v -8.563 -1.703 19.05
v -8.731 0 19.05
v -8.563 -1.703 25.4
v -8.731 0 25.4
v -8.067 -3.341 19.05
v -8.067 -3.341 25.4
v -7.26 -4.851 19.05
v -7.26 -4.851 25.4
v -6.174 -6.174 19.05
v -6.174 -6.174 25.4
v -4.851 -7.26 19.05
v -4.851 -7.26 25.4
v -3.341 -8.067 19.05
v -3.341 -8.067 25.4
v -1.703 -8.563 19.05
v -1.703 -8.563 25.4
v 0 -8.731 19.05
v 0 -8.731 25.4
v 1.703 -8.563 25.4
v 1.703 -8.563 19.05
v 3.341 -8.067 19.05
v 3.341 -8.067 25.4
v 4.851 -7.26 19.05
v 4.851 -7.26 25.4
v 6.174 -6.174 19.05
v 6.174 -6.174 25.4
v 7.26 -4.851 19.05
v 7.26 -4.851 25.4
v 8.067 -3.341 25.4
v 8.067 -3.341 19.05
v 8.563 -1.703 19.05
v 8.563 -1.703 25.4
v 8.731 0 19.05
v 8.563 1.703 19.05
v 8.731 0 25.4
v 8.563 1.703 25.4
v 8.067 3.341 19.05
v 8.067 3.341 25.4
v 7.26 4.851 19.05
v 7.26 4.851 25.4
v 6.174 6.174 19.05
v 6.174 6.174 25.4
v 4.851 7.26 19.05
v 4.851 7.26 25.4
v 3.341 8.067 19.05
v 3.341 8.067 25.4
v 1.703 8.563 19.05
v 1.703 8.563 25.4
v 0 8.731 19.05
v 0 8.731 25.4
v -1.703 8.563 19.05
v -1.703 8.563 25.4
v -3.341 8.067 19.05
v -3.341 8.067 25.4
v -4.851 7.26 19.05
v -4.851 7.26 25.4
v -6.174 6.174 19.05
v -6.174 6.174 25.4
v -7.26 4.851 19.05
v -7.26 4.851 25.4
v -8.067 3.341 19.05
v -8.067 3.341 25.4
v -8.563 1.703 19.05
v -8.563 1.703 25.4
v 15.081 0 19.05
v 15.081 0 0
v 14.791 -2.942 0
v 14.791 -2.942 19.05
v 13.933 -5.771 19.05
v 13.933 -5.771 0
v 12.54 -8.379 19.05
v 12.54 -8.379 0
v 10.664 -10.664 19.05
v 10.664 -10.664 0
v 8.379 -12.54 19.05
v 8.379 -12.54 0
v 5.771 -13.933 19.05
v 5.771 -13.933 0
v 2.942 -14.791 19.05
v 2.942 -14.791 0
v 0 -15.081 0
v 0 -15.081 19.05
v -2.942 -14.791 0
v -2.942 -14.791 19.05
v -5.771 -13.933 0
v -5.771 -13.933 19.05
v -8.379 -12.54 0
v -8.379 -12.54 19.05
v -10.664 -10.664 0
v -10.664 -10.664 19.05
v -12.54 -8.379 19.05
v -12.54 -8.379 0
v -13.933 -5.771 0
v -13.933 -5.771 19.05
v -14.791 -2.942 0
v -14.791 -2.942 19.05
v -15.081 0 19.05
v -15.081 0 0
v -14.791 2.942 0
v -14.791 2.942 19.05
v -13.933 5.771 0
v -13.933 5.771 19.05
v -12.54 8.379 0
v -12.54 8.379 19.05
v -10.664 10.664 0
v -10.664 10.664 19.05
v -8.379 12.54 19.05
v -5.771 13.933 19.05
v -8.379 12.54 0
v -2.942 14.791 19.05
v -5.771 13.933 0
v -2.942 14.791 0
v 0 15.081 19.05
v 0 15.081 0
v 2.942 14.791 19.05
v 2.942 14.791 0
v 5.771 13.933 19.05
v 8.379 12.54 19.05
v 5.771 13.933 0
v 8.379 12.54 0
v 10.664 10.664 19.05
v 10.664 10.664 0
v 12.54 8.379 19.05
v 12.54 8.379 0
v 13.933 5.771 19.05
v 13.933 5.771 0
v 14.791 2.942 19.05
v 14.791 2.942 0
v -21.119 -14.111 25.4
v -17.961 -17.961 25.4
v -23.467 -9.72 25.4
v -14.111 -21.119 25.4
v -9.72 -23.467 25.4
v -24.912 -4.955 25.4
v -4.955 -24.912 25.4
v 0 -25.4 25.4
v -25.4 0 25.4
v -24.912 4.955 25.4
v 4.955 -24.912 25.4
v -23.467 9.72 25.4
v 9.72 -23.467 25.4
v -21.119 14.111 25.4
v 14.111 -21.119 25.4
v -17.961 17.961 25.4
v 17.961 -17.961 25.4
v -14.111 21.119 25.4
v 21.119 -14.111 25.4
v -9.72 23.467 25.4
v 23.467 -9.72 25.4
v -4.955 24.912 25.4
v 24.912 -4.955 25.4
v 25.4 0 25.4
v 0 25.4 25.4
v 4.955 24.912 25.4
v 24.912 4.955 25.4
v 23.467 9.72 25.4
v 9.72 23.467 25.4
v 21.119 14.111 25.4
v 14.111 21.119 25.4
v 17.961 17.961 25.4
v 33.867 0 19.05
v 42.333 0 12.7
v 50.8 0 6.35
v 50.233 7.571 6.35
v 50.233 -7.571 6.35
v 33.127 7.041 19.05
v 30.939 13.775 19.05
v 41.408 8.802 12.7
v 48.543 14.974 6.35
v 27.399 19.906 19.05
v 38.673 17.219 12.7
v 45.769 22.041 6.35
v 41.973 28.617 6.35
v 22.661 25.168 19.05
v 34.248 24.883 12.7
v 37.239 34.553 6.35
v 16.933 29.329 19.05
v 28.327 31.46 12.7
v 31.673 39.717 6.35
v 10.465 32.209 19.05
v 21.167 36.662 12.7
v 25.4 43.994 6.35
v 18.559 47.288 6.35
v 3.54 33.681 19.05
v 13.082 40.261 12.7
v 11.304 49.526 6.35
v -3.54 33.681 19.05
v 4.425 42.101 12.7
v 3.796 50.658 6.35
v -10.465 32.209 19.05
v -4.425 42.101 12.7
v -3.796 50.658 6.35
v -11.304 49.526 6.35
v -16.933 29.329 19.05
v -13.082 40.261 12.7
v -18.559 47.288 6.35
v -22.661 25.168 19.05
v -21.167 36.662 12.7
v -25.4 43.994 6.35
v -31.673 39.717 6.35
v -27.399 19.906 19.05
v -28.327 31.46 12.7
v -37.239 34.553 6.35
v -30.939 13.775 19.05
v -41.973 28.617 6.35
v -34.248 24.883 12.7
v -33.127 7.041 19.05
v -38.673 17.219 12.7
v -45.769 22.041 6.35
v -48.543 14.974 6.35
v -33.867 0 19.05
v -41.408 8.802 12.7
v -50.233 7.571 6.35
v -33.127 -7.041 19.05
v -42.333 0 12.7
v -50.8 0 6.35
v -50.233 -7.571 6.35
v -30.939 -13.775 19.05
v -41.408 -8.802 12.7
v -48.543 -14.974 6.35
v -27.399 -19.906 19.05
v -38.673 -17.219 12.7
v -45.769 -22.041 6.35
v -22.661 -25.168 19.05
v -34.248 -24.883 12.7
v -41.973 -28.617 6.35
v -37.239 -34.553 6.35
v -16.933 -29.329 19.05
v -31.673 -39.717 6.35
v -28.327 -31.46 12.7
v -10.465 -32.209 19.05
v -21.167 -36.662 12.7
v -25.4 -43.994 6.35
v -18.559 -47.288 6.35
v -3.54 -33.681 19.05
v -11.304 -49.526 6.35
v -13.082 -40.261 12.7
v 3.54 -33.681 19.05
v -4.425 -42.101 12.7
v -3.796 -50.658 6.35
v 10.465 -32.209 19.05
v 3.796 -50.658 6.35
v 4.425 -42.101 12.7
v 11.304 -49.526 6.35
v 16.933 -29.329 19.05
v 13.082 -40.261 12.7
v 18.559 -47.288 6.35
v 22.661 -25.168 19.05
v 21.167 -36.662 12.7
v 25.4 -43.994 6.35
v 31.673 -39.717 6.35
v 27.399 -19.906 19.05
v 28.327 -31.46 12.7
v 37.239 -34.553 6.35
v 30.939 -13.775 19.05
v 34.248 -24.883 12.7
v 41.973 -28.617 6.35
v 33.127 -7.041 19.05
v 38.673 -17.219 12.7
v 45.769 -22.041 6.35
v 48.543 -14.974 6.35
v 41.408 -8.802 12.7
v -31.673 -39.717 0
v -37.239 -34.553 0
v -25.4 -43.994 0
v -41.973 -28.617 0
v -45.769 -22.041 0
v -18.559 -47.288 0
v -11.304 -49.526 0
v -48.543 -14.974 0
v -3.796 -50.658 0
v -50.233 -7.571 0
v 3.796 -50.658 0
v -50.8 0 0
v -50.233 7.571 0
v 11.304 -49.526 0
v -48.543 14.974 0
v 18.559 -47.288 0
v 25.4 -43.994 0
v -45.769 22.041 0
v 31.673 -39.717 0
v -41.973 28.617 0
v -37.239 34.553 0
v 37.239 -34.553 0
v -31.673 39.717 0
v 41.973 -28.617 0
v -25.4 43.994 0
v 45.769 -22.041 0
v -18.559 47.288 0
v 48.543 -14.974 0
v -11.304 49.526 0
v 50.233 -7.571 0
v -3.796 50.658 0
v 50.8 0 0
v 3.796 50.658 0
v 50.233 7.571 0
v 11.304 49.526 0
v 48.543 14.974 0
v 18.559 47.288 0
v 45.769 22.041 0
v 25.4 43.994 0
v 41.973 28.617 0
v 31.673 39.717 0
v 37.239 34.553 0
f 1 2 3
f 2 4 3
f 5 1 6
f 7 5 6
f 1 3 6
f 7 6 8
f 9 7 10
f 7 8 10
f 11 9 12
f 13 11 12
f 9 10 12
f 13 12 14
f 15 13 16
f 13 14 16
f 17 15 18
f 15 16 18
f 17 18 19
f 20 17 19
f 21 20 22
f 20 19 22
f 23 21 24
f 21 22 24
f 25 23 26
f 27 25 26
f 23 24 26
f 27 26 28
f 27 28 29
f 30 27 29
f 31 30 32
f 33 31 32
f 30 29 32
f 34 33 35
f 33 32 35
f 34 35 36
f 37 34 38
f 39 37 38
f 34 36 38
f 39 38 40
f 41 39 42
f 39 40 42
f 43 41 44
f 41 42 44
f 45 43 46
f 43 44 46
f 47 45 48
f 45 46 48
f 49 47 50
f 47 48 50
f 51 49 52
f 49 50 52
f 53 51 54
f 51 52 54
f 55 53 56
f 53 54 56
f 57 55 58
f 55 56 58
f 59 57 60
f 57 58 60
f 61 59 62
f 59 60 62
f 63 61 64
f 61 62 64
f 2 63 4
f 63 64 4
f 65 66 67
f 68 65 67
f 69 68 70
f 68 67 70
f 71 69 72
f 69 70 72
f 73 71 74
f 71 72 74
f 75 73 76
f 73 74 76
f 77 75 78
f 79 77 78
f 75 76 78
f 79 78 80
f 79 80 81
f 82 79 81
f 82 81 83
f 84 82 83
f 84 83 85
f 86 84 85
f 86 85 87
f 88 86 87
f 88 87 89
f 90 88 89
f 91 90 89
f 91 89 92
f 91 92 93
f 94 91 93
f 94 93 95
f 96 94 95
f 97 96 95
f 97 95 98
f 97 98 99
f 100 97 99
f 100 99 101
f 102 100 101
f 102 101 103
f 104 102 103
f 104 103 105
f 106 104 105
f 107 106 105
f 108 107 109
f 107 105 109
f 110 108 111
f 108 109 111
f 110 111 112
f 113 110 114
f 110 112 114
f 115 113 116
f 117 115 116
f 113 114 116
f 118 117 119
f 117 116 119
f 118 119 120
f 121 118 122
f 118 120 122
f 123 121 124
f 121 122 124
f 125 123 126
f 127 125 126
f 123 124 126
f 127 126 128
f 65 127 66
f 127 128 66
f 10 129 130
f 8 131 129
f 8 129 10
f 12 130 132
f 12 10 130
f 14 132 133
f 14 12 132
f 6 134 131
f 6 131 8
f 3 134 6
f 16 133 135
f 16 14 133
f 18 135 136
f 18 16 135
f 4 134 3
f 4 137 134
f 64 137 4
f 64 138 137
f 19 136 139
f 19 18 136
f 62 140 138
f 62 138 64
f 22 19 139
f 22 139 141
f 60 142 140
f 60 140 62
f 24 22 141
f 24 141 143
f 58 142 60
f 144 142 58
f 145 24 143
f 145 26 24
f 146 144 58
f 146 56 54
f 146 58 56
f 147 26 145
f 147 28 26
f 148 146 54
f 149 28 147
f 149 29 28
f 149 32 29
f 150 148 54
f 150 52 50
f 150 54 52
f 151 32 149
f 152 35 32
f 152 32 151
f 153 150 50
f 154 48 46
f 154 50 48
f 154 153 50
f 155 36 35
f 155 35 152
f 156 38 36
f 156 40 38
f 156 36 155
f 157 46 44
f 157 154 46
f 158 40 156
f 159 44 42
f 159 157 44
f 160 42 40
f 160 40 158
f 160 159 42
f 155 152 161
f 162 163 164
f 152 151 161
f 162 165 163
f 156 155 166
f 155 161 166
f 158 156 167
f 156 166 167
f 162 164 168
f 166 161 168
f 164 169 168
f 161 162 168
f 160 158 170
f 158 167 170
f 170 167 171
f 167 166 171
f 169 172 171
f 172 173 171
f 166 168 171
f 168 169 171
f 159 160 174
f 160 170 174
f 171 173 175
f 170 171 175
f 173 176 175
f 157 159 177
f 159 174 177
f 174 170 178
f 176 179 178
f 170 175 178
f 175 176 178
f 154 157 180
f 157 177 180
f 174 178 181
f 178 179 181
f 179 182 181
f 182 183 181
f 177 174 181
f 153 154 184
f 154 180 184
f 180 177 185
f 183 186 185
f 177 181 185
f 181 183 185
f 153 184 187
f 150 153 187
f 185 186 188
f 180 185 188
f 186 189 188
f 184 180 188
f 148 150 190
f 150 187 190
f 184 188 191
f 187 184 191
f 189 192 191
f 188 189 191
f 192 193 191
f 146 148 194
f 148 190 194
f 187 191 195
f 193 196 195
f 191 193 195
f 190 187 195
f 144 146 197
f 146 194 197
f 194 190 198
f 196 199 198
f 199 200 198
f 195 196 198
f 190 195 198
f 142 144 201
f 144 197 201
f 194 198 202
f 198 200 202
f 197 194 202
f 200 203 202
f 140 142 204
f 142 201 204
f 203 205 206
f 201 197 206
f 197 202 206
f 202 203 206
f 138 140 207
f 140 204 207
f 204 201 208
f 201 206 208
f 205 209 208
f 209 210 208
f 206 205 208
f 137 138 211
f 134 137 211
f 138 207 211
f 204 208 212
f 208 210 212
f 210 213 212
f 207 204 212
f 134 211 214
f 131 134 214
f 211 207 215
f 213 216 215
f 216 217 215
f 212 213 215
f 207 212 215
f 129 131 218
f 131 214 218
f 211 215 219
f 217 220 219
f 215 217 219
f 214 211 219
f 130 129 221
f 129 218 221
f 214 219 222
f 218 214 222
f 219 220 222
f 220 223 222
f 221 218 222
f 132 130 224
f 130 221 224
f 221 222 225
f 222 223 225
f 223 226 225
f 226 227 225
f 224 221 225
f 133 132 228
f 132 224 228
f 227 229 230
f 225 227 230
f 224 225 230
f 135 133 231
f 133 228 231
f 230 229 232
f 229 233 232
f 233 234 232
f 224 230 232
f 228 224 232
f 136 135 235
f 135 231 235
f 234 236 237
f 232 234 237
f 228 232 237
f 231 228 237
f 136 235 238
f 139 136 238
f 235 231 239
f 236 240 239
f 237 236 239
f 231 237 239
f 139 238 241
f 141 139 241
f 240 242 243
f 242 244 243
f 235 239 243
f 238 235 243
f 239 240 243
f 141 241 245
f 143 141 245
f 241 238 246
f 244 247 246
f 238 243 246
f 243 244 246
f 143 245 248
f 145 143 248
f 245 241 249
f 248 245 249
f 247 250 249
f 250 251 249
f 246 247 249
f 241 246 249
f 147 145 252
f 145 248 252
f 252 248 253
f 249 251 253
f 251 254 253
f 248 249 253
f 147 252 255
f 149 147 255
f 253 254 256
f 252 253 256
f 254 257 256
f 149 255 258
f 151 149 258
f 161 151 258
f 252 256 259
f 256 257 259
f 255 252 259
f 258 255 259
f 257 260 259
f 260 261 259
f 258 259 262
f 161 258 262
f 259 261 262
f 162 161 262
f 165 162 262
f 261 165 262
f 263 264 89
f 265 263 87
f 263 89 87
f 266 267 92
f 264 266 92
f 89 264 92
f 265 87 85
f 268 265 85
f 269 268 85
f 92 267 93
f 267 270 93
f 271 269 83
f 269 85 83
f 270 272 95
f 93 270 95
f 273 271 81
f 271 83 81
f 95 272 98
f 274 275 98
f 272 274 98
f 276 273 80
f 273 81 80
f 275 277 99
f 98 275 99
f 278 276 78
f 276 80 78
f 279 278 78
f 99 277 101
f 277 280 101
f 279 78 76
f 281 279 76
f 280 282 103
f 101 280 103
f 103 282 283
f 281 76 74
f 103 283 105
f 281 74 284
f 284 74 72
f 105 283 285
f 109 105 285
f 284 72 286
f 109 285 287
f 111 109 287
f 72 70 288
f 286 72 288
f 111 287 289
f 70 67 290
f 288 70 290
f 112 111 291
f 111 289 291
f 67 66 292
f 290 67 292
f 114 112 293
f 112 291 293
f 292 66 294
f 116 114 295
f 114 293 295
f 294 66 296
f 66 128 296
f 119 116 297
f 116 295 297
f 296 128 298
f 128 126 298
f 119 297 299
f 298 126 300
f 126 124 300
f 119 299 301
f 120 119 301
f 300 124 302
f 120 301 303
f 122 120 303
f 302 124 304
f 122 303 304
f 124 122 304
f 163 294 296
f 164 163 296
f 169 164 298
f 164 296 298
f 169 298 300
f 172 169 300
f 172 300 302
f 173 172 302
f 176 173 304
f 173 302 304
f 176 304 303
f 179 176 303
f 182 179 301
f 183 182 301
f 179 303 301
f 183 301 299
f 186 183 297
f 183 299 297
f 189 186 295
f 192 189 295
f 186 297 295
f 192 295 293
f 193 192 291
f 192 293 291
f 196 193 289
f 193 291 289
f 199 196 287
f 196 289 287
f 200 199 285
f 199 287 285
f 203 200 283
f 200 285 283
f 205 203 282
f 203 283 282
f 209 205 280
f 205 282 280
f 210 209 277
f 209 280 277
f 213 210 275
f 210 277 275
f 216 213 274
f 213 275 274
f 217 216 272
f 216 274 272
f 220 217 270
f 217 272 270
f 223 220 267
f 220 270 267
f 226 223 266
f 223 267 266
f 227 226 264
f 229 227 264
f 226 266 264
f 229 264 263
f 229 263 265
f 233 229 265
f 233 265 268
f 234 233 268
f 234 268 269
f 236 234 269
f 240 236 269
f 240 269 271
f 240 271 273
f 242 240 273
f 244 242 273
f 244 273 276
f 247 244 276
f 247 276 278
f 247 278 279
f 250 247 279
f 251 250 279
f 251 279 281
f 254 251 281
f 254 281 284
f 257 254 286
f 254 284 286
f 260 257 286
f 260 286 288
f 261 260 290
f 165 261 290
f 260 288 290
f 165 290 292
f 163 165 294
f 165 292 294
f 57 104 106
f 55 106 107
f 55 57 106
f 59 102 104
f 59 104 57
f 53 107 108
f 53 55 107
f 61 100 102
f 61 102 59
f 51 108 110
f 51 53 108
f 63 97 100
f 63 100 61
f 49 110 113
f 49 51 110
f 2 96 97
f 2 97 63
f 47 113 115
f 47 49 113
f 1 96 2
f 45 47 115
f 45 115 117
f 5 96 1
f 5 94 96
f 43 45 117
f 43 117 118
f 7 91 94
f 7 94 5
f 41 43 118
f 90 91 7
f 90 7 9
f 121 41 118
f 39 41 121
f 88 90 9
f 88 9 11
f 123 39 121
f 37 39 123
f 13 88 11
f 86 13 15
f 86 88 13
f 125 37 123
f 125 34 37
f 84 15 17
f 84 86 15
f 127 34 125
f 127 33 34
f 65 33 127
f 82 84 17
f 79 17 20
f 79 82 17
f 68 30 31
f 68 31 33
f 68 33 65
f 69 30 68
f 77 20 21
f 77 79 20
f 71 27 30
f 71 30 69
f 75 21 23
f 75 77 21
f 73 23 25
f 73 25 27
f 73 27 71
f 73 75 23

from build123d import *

# Parameters (mm, degrees)
F0_R           = 50.8
F1_DEPTH       = 6.35
F3_R           = 25.4
F1_FACE_R      = 50.8
F6_D           = 17.4625
F6_CBORE_D     = 30.1625
F6_CBORE_DEPTH = 19.05


with BuildPart() as f1:
    # F0 (on Top) → F1 (new body)
    with BuildSketch(Plane.XY):
        Circle(F0_R)
    extrude(amount=F1_DEPTH)

    # F3 (on offset) → F4 section 0
    with BuildSketch(Plane.XY.offset(25.4)):
        Circle(F3_R)
    # F1_face (on face) → F4 section 1
    with BuildSketch(Plane.XY.offset(6.35)):
        Circle(F1_FACE_R)
    loft()

    # F6 (through all)
    with Locations(Plane(origin=(0, 0, 0), x_dir=(1, 0, 0), z_dir=(0, 0, -1))):
        with Locations((0, 0)):
            CounterBoreHole(F6_D / 2, F6_CBORE_D / 2, F6_CBORE_DEPTH)


solid = f1.part
